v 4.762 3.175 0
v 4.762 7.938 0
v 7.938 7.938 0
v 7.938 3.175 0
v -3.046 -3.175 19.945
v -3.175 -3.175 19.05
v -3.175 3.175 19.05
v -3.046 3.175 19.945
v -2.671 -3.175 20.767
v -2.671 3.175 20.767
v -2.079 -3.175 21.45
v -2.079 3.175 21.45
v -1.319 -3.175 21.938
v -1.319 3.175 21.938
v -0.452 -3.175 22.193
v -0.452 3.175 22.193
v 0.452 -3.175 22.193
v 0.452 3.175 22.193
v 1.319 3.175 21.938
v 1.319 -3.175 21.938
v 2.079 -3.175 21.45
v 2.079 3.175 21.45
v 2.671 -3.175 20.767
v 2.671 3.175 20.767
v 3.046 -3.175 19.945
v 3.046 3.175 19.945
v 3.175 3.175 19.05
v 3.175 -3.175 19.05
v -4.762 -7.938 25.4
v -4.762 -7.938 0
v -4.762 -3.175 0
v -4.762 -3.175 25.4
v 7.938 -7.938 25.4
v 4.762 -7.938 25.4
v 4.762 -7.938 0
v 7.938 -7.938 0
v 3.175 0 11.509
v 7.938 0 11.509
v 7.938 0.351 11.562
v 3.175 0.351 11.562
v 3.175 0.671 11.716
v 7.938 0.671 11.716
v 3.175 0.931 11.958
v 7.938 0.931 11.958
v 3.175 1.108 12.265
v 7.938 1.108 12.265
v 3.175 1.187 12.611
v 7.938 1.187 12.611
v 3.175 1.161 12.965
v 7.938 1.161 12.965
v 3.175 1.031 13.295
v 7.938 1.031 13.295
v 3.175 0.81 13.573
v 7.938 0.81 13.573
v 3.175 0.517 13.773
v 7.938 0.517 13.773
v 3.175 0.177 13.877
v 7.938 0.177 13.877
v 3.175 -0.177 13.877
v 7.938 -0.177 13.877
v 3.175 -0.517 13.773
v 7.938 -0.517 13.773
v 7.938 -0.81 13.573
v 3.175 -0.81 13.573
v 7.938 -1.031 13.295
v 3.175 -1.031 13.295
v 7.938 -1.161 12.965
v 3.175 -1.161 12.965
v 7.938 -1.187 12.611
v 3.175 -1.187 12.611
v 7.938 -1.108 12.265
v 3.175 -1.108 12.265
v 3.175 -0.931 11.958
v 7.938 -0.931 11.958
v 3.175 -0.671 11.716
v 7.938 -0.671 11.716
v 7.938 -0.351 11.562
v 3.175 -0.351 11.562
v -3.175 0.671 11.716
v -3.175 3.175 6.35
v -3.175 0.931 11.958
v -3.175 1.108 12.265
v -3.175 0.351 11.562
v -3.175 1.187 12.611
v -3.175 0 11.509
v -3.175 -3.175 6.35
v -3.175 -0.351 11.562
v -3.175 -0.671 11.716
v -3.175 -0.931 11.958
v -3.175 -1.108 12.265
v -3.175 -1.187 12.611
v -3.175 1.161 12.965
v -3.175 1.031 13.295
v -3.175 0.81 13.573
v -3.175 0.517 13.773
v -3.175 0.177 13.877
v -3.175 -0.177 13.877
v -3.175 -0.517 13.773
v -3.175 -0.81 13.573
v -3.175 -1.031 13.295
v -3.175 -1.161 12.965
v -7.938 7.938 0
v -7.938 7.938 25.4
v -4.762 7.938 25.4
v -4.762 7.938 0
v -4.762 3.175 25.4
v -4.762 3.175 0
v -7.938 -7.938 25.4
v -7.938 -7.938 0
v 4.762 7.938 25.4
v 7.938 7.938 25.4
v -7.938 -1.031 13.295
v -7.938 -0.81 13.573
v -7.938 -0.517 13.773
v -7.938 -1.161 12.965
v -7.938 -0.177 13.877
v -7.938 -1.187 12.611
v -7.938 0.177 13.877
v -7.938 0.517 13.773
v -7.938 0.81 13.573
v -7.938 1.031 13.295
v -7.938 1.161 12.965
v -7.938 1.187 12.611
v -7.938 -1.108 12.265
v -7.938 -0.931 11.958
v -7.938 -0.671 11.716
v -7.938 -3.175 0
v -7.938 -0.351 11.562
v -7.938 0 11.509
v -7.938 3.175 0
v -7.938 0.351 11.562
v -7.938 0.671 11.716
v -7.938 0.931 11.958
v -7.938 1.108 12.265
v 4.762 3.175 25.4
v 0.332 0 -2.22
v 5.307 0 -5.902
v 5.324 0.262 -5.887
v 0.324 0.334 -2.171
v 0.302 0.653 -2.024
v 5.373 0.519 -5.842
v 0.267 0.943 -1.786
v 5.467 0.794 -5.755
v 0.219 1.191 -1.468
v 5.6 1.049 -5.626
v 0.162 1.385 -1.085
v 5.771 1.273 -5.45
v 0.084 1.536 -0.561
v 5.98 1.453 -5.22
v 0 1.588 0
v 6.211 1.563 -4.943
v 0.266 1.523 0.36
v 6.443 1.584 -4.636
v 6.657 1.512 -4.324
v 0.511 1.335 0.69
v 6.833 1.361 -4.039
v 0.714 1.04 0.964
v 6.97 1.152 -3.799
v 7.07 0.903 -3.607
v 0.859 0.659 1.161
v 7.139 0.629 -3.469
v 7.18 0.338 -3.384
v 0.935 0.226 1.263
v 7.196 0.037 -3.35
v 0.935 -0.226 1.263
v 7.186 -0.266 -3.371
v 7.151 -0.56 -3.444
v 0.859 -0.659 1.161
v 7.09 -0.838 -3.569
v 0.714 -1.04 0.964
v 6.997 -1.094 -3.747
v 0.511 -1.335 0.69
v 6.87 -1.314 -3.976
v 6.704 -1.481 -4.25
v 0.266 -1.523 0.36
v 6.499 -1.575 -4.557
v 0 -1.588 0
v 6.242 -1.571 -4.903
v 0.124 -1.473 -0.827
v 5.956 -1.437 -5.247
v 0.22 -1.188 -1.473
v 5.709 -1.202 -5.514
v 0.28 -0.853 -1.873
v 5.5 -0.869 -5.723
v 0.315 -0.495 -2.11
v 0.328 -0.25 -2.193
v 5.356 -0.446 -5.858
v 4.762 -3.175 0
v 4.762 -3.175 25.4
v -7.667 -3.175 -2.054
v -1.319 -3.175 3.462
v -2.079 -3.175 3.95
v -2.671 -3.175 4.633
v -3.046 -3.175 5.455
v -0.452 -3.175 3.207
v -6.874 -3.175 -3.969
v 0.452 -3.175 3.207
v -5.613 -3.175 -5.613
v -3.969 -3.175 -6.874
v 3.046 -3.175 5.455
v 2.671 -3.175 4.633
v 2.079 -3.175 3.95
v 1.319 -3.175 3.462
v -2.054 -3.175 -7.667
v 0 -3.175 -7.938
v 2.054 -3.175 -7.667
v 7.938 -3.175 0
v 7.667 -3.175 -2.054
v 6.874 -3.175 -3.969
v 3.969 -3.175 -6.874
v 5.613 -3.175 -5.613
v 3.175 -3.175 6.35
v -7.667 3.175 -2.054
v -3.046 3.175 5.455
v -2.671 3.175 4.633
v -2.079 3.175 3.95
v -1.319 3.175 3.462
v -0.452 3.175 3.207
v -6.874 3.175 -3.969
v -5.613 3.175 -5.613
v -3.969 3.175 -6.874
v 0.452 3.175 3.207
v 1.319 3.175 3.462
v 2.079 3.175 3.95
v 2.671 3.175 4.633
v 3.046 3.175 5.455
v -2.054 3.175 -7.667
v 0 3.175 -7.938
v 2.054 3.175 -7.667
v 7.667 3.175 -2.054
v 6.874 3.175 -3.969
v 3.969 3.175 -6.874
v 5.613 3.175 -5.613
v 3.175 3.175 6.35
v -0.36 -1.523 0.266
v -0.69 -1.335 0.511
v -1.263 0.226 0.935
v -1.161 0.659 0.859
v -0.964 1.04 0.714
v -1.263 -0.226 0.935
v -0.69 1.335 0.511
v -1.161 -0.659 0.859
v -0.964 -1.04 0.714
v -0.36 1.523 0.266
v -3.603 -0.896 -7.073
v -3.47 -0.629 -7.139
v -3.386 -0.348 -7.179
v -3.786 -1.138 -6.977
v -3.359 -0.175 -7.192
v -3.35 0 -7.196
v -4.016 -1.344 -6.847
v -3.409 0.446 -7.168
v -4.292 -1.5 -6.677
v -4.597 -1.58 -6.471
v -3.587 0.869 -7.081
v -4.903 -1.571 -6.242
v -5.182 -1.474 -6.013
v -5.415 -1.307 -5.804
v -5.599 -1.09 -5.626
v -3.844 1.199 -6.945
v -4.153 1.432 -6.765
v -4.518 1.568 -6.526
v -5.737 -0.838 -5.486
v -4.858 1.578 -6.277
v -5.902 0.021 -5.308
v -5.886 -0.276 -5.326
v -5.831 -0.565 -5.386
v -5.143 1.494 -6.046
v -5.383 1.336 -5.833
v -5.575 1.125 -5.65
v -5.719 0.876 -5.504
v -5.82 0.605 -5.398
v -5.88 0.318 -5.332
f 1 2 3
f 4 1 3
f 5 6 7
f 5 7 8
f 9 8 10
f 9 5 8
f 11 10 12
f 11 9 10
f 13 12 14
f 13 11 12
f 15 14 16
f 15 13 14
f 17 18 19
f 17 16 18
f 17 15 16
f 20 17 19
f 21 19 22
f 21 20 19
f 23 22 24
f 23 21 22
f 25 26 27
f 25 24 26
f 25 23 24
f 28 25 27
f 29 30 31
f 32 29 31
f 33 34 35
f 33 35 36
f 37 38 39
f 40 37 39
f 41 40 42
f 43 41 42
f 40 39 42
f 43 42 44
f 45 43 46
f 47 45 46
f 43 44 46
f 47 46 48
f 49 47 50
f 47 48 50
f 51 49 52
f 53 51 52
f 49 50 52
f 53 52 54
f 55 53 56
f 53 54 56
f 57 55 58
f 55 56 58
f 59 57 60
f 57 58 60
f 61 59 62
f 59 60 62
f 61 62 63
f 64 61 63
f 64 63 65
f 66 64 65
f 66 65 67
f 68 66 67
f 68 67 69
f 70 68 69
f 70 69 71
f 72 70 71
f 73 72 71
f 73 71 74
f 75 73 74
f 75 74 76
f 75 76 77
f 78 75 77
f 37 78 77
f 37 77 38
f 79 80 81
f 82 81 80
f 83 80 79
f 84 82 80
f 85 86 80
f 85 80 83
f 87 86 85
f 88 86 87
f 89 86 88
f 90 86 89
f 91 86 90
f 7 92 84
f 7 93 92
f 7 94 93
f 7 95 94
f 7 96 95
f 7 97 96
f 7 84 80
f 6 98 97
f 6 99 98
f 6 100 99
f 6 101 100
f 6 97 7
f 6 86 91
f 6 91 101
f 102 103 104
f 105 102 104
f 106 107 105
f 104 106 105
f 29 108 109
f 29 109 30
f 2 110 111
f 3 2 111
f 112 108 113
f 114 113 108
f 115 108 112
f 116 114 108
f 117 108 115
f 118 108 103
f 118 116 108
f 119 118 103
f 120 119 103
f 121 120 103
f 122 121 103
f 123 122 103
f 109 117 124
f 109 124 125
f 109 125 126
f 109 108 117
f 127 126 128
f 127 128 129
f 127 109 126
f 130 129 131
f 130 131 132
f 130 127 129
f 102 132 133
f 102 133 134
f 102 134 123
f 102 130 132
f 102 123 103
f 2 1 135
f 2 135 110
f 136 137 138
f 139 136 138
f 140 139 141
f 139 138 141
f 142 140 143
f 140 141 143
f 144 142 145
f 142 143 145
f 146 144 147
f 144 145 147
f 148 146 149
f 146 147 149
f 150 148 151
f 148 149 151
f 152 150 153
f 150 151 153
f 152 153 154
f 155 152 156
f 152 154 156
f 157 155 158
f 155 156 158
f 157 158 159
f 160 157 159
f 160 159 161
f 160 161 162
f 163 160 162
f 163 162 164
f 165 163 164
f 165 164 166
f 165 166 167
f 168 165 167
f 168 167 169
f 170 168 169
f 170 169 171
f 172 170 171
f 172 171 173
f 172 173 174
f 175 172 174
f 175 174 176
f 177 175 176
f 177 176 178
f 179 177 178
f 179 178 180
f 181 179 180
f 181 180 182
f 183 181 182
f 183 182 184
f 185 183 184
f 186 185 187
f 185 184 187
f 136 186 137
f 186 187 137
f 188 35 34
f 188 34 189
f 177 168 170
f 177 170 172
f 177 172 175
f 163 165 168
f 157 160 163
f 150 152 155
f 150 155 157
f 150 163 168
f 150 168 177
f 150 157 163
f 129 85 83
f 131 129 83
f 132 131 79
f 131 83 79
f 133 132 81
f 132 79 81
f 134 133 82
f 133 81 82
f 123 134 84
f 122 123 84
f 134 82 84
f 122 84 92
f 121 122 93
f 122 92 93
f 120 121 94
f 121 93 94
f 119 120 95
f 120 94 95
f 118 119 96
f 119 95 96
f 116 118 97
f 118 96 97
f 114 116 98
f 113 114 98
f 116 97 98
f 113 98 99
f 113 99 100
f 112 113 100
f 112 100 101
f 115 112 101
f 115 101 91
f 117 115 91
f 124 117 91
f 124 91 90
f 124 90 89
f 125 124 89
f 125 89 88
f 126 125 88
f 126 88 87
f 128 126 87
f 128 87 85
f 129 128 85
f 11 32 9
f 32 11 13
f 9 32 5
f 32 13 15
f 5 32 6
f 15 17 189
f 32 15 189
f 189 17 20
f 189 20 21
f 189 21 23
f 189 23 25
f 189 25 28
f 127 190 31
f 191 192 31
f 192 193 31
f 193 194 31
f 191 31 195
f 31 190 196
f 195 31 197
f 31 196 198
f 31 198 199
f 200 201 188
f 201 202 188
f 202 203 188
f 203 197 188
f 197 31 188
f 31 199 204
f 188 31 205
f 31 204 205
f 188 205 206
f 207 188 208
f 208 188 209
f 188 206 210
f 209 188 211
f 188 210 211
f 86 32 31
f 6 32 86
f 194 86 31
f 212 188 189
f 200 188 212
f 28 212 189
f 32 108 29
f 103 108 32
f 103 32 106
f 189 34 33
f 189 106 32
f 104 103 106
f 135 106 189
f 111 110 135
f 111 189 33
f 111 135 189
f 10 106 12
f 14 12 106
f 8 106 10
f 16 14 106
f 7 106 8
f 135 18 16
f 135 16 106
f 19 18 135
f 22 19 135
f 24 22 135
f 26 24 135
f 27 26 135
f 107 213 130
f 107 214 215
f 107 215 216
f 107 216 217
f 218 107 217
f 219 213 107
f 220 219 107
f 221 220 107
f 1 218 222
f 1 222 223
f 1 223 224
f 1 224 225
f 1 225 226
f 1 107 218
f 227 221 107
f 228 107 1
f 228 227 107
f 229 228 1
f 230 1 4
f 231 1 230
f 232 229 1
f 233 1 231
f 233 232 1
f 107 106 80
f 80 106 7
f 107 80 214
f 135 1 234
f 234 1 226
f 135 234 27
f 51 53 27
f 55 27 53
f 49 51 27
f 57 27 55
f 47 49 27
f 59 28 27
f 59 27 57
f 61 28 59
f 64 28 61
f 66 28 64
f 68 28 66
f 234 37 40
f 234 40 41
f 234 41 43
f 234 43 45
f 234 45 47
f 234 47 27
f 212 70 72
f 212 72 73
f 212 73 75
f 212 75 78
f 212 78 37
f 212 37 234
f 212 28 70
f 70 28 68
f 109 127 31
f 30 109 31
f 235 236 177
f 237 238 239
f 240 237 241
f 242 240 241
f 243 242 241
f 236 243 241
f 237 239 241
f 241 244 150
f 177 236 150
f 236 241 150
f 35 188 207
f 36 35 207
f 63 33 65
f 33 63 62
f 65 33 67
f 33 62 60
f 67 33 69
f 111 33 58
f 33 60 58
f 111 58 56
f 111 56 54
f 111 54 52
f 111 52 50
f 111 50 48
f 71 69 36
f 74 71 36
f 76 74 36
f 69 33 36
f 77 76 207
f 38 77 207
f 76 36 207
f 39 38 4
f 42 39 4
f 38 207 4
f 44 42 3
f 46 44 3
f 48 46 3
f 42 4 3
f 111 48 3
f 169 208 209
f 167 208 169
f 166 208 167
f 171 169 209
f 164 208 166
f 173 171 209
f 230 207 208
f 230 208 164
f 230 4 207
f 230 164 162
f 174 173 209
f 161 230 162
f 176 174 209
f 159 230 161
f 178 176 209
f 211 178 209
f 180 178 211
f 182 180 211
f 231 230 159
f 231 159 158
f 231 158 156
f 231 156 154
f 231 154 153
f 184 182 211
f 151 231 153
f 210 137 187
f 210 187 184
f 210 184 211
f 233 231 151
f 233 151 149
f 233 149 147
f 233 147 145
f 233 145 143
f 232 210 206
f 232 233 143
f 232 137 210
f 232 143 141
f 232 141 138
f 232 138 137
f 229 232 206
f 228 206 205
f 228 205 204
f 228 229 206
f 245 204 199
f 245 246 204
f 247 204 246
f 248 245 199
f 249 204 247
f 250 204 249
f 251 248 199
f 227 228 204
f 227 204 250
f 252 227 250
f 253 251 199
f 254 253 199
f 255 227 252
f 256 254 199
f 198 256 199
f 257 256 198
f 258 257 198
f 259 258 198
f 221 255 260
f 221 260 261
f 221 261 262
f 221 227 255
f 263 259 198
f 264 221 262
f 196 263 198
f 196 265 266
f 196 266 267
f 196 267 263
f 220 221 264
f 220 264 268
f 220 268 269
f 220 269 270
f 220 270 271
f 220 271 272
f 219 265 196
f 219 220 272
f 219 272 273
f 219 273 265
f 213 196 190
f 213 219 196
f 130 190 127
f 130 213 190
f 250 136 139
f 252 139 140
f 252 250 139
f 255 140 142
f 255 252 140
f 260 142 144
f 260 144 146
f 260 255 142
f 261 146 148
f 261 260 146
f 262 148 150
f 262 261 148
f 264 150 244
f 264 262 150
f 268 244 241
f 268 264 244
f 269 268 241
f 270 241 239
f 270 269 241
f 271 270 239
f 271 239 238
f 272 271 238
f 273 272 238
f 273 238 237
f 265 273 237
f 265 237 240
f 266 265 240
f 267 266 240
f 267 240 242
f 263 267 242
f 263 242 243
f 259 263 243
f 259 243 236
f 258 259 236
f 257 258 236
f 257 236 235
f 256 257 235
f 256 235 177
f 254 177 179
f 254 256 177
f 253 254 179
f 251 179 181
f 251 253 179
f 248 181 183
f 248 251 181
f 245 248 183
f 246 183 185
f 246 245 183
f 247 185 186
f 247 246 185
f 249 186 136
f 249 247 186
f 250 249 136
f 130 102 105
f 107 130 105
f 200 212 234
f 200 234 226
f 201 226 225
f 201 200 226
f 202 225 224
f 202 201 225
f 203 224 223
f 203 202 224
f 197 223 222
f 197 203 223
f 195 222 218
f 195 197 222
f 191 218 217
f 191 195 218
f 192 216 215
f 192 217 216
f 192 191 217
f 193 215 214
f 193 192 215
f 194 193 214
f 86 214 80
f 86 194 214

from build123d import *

# Parameters (mm, degrees)
SKETCH1_W                = 15.875
SKETCH1_H                = 15.875
BOSS_EXTRUDE1_DEPTH      = 25.4
BOSS_EXTRUDE3_DEPTH      = 3.175
BOSS_EXTRUDE3_DEPTH_BACK = 3.175
SKETCH4_R                = 1.190625
CUT_EXTRUDE1_DEPTH       = 16.875
SKETCH8_R                = 1.5875
CUT_EXTRUDE3_DEPTH       = 7.9375
SKETCH7_R                = 1.5875
CUT_EXTRUDE4_DEPTH       = 7.9375
SKETCH9_W                = 9.525
SKETCH9_H                = 4.7625
CUT_EXTRUDE5_DEPTH       = 26.4
CUT_EXTRUDE6_DEPTH       = 12.1125


with BuildPart() as part:
    # Sketch1 → Boss-Extrude1 (new body)
    with BuildSketch(Plane.XY):
        Rectangle(SKETCH1_W, SKETCH1_H)
    extrude(amount=BOSS_EXTRUDE1_DEPTH)

    # Sketch3 → Boss-Extrude3 (add, two sides)
    with BuildSketch(Plane(origin=(0, 0, 0), x_dir=(1, 0, 0), z_dir=(0, 1, 0))) as boss_extrude3_sk:
        with BuildLine():
            Line((-7.9375, 0), (7.9375, 0))
            ThreePointArc((7.9375, 0), (0, 7.9375), (-7.9375, 0))
        make_face()
    extrude(amount=BOSS_EXTRUDE3_DEPTH)
    extrude(boss_extrude3_sk.sketch, amount=-BOSS_EXTRUDE3_DEPTH_BACK)

    # Sketch4 → Cut-Extrude1 (cut, through all)
    with BuildSketch(Plane(origin=(7.9375, 0, 0), x_dir=(0, 0, -1), z_dir=(1, 0, 0))):
        with Locations((-12.7, 0)):
            Circle(SKETCH4_R)
    extrude(amount=-CUT_EXTRUDE1_DEPTH, mode=Mode.SUBTRACT)

    # Sketch8 → Cut-Extrude3 (cut)
    with BuildSketch(Plane(origin=(6.380613831, 0, -4.72140587), x_dir=(-0.594822787, 0, -0.803856861), z_dir=(0.803856861, 0, -0.594822787))):
        Circle(SKETCH8_R)
    extrude(amount=-CUT_EXTRUDE3_DEPTH, mode=Mode.SUBTRACT)

    # Sketch7 → Cut-Extrude4 (cut)
    with BuildSketch(Plane(origin=(-4.72140587, 0, -6.380613831), x_dir=(0.803856861, 0, -0.594822787), z_dir=(0.594822787, 0, 0.803856861))):
        Circle(SKETCH7_R)
    extrude(amount=CUT_EXTRUDE4_DEPTH, mode=Mode.SUBTRACT)

    # Sketch9 → Cut-Extrude5 (cut, through all)
    with BuildSketch(Plane(origin=(0, 0, 0), x_dir=(-1, 0, 0), z_dir=(0, 0, -1))):
        with Locations((0, 5.55625)):
            Rectangle(SKETCH9_W, SKETCH9_H)
        with Locations((0, -5.55625)):
            Rectangle(SKETCH9_W, SKETCH9_H)
    extrude(amount=-CUT_EXTRUDE5_DEPTH, mode=Mode.SUBTRACT)

    # Sketch10 → Cut-Extrude6 (cut, through all)
    with BuildSketch(Plane(origin=(0, -3.175, 0), x_dir=(-1, 0, 0), z_dir=(0, -1, 0))):
        with BuildLine():
            Line((-3.175, -19.05), (-3.175, -6.35))
            ThreePointArc((-3.175, -6.35), (0, -3.175), (3.175, -6.35))
            Line((3.175, -6.35), (3.175, -19.05))
            ThreePointArc((3.175, -19.05), (0, -22.225), (-3.175, -19.05))
        make_face()
    extrude(amount=-CUT_EXTRUDE6_DEPTH, mode=Mode.SUBTRACT)


solid = part.part
